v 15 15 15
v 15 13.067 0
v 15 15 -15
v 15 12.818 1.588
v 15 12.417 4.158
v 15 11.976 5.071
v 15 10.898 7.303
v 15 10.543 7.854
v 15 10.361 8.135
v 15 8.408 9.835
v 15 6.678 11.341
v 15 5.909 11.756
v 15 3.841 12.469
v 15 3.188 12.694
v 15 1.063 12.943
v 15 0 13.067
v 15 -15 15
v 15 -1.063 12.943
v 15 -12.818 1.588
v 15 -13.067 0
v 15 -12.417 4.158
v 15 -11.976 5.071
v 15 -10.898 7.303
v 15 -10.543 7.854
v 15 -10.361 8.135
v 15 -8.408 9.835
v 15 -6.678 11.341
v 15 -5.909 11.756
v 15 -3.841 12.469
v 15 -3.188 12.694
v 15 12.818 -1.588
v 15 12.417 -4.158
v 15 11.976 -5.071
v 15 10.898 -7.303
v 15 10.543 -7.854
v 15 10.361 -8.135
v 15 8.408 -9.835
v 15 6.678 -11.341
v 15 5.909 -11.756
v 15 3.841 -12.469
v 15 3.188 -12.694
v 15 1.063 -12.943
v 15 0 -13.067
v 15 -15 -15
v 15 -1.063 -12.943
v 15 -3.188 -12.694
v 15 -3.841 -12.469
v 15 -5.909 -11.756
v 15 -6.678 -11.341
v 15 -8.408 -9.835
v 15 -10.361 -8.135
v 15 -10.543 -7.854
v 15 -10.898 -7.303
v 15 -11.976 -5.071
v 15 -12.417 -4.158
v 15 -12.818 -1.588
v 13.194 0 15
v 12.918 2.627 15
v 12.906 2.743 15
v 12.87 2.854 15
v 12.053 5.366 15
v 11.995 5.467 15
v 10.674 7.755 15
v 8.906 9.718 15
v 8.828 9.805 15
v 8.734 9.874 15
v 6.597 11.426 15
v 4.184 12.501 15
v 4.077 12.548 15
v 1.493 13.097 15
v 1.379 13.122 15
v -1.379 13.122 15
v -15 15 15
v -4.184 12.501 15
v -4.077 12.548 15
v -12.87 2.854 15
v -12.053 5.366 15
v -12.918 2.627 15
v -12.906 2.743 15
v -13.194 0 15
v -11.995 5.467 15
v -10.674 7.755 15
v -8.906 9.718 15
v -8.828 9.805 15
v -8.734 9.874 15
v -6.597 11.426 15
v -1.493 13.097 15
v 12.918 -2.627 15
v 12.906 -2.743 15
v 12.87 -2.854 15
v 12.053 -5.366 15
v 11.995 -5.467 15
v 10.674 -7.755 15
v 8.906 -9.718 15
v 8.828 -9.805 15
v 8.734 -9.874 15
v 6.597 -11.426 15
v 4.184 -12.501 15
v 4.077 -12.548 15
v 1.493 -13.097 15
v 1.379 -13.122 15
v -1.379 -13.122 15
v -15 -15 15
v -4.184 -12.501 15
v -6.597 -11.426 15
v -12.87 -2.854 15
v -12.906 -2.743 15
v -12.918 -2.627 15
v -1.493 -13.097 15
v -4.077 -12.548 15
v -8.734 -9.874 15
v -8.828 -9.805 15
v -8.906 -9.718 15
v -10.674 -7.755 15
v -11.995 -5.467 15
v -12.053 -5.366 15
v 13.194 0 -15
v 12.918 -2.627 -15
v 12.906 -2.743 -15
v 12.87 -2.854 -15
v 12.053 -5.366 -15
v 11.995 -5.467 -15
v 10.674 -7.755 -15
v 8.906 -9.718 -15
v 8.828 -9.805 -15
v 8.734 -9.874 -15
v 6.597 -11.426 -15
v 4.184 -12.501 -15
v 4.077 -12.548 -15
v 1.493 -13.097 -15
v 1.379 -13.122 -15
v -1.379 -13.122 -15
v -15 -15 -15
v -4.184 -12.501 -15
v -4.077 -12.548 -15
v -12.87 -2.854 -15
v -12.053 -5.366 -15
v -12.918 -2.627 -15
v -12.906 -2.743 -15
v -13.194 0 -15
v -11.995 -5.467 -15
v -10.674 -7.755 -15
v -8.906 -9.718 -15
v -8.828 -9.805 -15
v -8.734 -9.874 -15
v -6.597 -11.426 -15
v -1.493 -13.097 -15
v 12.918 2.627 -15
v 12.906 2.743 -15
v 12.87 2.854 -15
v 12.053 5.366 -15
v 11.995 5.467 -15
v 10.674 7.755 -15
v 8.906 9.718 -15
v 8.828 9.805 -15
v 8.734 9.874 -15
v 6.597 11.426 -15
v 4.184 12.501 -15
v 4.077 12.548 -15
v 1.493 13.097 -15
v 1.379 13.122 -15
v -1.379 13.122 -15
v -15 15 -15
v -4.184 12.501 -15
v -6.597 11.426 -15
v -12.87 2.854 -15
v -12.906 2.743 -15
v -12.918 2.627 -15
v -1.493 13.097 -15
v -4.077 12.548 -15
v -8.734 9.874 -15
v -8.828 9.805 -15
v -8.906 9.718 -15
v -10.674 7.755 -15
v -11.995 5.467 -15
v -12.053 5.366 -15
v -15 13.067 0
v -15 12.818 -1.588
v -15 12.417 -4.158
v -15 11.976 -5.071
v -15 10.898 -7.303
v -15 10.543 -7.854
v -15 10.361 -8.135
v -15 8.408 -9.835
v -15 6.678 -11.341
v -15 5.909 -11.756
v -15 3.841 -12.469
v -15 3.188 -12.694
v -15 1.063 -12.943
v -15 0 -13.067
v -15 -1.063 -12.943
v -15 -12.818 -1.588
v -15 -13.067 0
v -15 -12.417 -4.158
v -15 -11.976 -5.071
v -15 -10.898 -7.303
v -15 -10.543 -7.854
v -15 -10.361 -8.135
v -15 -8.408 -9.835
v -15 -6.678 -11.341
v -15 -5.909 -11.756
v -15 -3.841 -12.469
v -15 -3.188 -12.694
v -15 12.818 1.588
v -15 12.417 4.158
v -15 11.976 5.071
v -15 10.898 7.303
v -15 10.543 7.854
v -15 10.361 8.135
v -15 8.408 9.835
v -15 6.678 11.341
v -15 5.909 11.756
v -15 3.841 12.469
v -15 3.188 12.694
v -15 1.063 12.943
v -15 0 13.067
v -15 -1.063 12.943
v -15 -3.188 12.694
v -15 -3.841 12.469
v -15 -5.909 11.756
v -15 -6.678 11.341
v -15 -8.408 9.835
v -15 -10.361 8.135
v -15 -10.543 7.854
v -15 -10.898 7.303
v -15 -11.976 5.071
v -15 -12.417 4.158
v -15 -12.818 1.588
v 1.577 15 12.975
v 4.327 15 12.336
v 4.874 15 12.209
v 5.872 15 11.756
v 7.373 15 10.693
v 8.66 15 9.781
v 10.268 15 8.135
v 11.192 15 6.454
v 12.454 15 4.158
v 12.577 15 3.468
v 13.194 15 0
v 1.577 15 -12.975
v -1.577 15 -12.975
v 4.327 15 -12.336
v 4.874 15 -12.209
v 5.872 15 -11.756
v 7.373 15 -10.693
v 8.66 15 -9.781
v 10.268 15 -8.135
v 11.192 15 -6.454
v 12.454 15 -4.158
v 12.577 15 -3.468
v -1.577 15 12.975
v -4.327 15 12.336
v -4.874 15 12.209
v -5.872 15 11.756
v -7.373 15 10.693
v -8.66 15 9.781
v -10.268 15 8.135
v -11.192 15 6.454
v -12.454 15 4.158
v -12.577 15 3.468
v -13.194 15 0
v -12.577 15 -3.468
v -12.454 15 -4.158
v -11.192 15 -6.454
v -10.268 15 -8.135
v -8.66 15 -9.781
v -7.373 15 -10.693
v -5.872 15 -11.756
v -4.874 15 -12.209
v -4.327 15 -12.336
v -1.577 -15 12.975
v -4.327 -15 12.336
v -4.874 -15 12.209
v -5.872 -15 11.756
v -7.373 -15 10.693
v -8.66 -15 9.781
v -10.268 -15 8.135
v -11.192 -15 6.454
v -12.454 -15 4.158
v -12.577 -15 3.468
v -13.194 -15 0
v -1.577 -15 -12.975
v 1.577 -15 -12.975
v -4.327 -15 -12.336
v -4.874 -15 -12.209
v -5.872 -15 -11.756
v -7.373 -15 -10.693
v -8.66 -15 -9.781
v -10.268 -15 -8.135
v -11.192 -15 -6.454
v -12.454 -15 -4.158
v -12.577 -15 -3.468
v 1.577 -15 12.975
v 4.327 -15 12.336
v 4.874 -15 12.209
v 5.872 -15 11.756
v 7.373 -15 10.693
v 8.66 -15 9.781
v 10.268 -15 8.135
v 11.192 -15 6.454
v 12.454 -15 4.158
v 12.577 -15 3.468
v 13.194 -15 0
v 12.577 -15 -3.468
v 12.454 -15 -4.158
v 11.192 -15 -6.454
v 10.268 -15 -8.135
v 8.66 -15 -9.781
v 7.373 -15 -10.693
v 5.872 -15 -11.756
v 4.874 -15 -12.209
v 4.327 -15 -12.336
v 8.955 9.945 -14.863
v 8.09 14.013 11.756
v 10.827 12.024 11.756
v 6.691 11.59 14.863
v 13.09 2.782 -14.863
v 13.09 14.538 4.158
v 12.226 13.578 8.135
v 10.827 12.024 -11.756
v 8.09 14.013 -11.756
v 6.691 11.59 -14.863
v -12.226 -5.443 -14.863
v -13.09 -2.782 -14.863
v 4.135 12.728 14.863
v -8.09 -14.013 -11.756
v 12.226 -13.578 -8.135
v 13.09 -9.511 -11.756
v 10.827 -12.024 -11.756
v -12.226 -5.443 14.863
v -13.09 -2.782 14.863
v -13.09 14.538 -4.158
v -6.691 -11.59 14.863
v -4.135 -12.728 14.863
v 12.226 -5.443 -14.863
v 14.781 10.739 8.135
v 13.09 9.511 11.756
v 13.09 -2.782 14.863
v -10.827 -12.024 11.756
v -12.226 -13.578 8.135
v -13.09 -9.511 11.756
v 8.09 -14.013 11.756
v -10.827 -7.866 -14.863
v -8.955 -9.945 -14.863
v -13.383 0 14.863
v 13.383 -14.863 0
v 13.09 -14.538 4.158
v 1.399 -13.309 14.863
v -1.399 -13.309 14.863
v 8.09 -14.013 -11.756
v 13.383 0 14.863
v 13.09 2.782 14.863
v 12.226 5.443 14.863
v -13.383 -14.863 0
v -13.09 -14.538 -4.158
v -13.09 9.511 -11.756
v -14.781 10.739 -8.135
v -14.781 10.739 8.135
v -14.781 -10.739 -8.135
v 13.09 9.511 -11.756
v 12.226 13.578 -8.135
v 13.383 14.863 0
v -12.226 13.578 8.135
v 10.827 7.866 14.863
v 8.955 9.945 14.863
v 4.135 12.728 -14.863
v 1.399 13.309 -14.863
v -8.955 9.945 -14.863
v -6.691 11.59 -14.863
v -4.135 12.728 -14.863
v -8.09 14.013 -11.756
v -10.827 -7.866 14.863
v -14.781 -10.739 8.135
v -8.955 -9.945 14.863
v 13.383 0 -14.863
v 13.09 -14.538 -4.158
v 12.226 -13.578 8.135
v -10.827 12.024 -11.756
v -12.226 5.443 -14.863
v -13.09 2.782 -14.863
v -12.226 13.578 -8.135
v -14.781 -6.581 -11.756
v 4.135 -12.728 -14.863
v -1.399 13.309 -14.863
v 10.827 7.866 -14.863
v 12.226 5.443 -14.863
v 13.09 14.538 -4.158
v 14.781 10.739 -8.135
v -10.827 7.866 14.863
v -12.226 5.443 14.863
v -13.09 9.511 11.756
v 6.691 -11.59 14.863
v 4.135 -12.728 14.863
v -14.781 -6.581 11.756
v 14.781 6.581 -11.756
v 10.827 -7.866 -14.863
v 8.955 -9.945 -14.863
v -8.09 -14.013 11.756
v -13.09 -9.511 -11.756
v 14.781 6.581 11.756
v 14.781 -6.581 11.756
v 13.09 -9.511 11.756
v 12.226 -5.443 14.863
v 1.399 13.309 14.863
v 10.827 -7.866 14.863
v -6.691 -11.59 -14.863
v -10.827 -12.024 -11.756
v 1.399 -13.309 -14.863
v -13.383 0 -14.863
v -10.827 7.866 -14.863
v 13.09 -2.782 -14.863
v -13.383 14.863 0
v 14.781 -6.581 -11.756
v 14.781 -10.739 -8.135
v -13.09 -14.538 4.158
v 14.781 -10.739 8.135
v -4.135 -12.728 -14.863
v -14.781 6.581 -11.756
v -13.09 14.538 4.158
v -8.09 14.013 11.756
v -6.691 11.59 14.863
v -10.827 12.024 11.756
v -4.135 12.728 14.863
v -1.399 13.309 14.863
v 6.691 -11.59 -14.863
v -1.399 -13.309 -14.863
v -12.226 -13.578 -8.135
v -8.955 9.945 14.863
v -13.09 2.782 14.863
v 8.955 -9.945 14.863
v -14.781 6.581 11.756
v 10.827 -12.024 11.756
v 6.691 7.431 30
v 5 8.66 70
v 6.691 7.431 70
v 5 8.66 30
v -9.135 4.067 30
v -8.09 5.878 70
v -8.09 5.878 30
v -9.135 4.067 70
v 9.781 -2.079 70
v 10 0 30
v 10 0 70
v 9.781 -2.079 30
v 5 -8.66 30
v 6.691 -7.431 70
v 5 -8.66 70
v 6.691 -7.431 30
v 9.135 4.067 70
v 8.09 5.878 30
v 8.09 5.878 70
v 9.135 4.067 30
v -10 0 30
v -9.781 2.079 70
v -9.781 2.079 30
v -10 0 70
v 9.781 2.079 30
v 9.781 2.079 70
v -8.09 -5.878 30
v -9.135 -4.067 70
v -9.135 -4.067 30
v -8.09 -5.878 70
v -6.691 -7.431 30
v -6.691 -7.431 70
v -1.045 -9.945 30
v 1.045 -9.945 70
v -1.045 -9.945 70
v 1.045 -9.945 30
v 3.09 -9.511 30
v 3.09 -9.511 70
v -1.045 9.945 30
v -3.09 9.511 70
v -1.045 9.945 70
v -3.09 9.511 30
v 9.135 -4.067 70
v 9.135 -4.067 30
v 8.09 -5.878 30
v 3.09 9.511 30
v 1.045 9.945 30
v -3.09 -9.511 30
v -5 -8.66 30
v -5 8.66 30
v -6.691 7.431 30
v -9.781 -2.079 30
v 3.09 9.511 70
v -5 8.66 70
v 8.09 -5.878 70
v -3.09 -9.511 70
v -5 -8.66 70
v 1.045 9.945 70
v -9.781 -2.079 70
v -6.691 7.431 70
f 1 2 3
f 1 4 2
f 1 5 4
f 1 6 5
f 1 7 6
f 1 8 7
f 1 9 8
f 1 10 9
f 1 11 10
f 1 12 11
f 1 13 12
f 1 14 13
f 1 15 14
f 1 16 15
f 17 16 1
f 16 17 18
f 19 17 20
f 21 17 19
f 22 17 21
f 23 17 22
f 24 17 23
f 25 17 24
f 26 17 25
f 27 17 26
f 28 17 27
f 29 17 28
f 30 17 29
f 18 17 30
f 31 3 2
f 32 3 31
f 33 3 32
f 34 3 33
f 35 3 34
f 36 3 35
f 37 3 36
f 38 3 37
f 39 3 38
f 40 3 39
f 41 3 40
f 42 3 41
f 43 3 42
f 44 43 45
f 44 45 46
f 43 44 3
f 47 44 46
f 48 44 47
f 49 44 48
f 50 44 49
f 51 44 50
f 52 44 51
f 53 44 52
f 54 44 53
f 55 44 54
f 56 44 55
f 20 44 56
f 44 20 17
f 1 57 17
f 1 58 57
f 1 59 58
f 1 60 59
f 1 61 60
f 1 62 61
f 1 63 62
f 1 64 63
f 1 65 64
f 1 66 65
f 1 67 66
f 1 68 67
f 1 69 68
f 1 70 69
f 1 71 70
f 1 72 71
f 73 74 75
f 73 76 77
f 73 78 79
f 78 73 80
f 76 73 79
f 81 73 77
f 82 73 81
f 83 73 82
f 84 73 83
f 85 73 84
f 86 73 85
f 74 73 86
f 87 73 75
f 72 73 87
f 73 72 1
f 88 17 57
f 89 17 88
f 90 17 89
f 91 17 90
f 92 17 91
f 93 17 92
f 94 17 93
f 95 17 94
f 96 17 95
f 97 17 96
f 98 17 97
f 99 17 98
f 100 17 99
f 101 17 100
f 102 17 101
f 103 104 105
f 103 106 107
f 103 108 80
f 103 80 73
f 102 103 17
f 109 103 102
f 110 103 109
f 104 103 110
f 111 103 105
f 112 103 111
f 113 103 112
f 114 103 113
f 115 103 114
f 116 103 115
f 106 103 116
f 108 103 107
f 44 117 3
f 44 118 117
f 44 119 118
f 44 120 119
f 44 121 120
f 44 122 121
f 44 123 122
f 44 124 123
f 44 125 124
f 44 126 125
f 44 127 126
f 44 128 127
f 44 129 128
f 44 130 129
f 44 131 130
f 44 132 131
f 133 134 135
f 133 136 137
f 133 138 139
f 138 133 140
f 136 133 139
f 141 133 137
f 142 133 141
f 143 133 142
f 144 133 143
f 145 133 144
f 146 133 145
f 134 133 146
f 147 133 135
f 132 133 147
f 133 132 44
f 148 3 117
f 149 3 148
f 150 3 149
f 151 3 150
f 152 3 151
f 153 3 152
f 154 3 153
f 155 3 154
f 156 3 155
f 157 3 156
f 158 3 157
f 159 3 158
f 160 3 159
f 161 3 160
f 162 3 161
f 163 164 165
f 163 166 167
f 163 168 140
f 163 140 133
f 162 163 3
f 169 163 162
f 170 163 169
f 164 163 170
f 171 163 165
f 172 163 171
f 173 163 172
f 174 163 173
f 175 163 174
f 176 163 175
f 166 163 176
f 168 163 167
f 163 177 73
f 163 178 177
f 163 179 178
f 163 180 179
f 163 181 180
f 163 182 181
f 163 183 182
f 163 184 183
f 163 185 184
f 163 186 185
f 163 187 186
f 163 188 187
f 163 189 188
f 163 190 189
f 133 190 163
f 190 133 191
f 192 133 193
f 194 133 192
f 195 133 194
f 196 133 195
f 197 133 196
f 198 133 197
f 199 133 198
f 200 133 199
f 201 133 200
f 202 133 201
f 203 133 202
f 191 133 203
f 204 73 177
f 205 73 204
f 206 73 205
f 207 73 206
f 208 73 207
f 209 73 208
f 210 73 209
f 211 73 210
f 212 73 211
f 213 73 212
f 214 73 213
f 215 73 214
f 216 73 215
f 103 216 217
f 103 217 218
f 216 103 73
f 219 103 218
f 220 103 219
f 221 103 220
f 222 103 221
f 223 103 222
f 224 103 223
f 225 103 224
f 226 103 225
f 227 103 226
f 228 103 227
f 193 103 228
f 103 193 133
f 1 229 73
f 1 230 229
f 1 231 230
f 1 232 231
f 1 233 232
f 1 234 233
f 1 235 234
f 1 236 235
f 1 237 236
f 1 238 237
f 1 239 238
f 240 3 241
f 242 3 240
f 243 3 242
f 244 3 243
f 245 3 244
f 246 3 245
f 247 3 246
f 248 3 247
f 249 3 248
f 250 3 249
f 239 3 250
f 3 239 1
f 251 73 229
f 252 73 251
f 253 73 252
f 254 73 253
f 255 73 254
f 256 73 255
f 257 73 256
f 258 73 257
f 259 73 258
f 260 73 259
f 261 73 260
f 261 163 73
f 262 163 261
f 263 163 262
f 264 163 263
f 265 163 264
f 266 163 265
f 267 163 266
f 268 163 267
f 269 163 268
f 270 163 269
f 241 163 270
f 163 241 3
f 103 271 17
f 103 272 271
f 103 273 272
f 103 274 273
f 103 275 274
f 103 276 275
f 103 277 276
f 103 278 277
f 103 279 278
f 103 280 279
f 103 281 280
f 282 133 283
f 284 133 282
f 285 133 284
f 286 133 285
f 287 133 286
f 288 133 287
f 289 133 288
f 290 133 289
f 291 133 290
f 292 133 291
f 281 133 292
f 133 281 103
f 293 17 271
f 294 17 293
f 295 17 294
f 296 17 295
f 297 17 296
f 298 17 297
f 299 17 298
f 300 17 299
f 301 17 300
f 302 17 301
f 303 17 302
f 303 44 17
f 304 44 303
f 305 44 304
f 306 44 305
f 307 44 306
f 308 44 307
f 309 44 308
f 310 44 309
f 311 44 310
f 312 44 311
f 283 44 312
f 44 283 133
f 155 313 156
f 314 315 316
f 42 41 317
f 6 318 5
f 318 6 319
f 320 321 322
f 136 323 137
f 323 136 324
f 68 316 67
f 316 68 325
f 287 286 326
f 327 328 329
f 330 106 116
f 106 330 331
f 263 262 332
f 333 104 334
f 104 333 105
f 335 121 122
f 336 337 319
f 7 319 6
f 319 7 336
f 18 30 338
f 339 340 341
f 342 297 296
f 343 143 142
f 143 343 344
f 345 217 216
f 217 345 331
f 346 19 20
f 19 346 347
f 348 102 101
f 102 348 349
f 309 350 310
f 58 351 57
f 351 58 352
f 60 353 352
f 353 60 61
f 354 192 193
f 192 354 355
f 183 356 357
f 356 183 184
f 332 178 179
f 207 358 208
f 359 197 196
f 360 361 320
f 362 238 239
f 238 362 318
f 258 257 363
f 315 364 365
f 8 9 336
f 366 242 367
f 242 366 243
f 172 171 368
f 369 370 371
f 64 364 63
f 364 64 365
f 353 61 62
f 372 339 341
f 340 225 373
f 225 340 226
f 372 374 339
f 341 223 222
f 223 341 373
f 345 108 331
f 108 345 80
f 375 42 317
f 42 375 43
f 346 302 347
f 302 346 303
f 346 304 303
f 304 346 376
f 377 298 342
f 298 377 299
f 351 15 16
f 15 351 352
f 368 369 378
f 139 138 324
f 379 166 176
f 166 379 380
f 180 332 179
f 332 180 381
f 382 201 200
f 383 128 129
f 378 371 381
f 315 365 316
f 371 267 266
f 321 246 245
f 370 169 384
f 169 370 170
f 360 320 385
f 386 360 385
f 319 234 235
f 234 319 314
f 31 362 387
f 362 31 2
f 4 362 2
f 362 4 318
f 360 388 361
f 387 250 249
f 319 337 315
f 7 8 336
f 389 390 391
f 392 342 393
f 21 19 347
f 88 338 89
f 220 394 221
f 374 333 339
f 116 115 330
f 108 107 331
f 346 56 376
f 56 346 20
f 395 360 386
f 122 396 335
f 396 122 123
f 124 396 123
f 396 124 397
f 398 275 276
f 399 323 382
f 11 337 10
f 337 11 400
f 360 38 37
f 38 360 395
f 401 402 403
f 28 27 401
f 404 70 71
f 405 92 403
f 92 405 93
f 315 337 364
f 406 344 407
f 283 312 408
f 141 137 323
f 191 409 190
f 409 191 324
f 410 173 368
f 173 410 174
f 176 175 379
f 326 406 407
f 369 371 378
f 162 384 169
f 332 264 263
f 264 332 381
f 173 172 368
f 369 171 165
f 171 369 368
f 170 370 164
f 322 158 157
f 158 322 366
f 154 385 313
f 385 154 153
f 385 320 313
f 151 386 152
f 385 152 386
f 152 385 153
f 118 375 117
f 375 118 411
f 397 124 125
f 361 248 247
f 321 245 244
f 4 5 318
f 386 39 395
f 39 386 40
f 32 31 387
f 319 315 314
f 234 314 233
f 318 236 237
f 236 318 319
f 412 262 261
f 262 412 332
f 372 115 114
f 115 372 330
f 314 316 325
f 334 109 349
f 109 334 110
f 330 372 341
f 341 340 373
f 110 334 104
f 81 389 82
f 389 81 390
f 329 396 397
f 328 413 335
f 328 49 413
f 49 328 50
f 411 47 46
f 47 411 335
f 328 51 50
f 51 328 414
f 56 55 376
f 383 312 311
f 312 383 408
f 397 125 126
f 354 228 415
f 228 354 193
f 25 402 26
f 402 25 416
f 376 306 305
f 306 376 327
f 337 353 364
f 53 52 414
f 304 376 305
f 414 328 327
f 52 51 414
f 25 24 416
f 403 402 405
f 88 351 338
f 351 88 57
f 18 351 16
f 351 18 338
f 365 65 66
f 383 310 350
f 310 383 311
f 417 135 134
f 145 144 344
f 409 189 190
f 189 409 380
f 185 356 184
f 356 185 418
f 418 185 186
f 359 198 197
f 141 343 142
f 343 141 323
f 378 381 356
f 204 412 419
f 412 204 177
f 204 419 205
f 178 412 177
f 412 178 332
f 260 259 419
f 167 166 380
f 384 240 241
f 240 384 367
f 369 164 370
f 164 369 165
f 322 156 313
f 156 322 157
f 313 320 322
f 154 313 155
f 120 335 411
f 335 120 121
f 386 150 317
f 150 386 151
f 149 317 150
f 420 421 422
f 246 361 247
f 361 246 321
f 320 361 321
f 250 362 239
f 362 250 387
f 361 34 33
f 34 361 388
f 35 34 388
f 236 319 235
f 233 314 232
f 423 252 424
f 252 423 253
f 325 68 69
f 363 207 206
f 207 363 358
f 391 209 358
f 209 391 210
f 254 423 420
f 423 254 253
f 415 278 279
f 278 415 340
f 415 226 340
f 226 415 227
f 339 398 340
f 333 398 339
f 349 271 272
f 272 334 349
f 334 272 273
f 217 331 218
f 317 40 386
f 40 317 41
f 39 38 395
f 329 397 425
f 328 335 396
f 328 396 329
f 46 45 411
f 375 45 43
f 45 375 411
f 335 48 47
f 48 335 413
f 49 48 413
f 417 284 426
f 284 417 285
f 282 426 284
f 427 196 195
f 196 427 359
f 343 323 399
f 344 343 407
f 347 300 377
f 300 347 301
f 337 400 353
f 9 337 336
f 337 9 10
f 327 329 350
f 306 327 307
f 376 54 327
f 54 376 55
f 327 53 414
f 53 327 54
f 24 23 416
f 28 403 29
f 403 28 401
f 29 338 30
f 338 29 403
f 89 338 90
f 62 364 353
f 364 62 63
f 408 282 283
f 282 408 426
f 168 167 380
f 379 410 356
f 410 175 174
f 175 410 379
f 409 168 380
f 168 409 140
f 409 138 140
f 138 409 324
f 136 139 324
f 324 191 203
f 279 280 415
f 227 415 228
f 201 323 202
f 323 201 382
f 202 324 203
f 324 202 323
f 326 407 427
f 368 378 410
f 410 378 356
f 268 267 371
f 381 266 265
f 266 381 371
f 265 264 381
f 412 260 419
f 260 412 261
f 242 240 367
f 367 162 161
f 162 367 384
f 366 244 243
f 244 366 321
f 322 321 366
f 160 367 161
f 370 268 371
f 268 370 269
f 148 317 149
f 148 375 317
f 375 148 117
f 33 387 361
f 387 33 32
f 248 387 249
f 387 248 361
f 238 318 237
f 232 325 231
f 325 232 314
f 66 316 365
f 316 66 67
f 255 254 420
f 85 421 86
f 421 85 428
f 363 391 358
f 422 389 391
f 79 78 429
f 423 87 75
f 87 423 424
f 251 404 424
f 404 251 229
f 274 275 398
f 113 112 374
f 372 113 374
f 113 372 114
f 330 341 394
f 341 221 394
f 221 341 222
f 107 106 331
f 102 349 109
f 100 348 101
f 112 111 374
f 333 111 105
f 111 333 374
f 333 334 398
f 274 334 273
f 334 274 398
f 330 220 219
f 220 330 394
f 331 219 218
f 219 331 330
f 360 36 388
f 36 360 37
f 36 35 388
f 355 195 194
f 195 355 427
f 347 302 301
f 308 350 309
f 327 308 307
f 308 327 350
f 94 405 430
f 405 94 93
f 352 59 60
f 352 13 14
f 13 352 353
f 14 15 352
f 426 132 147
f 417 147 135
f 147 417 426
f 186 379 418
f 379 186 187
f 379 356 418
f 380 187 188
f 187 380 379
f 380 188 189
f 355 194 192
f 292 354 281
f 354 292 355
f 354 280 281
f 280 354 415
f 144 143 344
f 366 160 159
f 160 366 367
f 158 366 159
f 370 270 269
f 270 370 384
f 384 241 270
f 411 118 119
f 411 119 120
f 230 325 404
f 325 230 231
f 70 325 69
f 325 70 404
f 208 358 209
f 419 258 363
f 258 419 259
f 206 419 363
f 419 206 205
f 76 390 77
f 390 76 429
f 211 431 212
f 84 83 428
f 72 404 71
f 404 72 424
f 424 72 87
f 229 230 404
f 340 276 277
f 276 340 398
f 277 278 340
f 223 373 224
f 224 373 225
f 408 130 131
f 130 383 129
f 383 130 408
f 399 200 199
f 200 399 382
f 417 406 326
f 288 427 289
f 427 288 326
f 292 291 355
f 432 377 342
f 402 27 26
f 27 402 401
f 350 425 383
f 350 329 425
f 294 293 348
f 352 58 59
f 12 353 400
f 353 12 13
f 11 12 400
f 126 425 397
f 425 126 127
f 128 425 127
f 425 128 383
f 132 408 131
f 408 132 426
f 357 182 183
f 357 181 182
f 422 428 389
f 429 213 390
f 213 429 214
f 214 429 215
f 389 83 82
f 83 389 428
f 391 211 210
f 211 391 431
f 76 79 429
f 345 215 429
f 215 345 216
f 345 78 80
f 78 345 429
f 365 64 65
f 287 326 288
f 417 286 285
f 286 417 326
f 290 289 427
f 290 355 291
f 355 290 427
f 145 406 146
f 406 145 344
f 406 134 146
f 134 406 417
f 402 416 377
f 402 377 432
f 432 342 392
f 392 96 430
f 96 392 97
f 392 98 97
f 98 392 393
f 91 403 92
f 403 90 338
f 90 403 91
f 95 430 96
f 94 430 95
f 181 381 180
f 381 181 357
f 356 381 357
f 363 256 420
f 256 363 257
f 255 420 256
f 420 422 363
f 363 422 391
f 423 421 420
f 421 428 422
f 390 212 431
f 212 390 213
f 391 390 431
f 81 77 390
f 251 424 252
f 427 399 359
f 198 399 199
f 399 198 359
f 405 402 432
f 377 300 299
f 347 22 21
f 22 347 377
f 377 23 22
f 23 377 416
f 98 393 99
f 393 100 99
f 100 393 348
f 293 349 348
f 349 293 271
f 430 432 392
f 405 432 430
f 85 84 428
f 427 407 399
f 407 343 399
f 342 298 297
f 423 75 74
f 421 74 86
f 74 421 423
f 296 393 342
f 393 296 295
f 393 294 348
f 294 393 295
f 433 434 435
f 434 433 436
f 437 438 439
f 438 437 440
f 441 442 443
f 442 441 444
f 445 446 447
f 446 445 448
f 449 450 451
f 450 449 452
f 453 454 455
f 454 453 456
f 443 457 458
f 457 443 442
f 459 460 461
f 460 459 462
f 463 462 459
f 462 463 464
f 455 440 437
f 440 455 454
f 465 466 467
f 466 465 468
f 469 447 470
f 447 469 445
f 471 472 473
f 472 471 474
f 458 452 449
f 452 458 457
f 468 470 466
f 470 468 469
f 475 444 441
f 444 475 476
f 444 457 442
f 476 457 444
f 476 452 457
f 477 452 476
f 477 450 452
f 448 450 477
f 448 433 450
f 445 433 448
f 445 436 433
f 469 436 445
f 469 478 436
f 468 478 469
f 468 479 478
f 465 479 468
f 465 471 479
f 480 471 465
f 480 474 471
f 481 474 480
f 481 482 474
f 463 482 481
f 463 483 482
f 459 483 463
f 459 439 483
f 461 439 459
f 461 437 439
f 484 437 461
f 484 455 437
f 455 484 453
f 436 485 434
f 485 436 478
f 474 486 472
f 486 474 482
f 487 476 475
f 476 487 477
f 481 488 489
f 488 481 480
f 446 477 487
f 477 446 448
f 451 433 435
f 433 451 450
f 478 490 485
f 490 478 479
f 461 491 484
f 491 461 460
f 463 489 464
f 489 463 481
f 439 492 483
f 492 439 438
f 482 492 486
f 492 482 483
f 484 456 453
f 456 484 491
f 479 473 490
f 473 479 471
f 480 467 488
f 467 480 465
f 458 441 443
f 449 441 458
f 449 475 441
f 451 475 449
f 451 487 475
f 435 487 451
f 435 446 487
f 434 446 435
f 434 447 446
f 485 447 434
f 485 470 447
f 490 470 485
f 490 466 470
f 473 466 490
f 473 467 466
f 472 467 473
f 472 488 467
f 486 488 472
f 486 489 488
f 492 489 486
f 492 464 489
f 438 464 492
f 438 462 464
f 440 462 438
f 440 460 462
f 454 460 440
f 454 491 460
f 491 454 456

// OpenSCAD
difference() {
    cube(30, center=true);
    sphere(20);
}
translate([0, 0, 30]) {
    cylinder(h=40, r=10);
}
